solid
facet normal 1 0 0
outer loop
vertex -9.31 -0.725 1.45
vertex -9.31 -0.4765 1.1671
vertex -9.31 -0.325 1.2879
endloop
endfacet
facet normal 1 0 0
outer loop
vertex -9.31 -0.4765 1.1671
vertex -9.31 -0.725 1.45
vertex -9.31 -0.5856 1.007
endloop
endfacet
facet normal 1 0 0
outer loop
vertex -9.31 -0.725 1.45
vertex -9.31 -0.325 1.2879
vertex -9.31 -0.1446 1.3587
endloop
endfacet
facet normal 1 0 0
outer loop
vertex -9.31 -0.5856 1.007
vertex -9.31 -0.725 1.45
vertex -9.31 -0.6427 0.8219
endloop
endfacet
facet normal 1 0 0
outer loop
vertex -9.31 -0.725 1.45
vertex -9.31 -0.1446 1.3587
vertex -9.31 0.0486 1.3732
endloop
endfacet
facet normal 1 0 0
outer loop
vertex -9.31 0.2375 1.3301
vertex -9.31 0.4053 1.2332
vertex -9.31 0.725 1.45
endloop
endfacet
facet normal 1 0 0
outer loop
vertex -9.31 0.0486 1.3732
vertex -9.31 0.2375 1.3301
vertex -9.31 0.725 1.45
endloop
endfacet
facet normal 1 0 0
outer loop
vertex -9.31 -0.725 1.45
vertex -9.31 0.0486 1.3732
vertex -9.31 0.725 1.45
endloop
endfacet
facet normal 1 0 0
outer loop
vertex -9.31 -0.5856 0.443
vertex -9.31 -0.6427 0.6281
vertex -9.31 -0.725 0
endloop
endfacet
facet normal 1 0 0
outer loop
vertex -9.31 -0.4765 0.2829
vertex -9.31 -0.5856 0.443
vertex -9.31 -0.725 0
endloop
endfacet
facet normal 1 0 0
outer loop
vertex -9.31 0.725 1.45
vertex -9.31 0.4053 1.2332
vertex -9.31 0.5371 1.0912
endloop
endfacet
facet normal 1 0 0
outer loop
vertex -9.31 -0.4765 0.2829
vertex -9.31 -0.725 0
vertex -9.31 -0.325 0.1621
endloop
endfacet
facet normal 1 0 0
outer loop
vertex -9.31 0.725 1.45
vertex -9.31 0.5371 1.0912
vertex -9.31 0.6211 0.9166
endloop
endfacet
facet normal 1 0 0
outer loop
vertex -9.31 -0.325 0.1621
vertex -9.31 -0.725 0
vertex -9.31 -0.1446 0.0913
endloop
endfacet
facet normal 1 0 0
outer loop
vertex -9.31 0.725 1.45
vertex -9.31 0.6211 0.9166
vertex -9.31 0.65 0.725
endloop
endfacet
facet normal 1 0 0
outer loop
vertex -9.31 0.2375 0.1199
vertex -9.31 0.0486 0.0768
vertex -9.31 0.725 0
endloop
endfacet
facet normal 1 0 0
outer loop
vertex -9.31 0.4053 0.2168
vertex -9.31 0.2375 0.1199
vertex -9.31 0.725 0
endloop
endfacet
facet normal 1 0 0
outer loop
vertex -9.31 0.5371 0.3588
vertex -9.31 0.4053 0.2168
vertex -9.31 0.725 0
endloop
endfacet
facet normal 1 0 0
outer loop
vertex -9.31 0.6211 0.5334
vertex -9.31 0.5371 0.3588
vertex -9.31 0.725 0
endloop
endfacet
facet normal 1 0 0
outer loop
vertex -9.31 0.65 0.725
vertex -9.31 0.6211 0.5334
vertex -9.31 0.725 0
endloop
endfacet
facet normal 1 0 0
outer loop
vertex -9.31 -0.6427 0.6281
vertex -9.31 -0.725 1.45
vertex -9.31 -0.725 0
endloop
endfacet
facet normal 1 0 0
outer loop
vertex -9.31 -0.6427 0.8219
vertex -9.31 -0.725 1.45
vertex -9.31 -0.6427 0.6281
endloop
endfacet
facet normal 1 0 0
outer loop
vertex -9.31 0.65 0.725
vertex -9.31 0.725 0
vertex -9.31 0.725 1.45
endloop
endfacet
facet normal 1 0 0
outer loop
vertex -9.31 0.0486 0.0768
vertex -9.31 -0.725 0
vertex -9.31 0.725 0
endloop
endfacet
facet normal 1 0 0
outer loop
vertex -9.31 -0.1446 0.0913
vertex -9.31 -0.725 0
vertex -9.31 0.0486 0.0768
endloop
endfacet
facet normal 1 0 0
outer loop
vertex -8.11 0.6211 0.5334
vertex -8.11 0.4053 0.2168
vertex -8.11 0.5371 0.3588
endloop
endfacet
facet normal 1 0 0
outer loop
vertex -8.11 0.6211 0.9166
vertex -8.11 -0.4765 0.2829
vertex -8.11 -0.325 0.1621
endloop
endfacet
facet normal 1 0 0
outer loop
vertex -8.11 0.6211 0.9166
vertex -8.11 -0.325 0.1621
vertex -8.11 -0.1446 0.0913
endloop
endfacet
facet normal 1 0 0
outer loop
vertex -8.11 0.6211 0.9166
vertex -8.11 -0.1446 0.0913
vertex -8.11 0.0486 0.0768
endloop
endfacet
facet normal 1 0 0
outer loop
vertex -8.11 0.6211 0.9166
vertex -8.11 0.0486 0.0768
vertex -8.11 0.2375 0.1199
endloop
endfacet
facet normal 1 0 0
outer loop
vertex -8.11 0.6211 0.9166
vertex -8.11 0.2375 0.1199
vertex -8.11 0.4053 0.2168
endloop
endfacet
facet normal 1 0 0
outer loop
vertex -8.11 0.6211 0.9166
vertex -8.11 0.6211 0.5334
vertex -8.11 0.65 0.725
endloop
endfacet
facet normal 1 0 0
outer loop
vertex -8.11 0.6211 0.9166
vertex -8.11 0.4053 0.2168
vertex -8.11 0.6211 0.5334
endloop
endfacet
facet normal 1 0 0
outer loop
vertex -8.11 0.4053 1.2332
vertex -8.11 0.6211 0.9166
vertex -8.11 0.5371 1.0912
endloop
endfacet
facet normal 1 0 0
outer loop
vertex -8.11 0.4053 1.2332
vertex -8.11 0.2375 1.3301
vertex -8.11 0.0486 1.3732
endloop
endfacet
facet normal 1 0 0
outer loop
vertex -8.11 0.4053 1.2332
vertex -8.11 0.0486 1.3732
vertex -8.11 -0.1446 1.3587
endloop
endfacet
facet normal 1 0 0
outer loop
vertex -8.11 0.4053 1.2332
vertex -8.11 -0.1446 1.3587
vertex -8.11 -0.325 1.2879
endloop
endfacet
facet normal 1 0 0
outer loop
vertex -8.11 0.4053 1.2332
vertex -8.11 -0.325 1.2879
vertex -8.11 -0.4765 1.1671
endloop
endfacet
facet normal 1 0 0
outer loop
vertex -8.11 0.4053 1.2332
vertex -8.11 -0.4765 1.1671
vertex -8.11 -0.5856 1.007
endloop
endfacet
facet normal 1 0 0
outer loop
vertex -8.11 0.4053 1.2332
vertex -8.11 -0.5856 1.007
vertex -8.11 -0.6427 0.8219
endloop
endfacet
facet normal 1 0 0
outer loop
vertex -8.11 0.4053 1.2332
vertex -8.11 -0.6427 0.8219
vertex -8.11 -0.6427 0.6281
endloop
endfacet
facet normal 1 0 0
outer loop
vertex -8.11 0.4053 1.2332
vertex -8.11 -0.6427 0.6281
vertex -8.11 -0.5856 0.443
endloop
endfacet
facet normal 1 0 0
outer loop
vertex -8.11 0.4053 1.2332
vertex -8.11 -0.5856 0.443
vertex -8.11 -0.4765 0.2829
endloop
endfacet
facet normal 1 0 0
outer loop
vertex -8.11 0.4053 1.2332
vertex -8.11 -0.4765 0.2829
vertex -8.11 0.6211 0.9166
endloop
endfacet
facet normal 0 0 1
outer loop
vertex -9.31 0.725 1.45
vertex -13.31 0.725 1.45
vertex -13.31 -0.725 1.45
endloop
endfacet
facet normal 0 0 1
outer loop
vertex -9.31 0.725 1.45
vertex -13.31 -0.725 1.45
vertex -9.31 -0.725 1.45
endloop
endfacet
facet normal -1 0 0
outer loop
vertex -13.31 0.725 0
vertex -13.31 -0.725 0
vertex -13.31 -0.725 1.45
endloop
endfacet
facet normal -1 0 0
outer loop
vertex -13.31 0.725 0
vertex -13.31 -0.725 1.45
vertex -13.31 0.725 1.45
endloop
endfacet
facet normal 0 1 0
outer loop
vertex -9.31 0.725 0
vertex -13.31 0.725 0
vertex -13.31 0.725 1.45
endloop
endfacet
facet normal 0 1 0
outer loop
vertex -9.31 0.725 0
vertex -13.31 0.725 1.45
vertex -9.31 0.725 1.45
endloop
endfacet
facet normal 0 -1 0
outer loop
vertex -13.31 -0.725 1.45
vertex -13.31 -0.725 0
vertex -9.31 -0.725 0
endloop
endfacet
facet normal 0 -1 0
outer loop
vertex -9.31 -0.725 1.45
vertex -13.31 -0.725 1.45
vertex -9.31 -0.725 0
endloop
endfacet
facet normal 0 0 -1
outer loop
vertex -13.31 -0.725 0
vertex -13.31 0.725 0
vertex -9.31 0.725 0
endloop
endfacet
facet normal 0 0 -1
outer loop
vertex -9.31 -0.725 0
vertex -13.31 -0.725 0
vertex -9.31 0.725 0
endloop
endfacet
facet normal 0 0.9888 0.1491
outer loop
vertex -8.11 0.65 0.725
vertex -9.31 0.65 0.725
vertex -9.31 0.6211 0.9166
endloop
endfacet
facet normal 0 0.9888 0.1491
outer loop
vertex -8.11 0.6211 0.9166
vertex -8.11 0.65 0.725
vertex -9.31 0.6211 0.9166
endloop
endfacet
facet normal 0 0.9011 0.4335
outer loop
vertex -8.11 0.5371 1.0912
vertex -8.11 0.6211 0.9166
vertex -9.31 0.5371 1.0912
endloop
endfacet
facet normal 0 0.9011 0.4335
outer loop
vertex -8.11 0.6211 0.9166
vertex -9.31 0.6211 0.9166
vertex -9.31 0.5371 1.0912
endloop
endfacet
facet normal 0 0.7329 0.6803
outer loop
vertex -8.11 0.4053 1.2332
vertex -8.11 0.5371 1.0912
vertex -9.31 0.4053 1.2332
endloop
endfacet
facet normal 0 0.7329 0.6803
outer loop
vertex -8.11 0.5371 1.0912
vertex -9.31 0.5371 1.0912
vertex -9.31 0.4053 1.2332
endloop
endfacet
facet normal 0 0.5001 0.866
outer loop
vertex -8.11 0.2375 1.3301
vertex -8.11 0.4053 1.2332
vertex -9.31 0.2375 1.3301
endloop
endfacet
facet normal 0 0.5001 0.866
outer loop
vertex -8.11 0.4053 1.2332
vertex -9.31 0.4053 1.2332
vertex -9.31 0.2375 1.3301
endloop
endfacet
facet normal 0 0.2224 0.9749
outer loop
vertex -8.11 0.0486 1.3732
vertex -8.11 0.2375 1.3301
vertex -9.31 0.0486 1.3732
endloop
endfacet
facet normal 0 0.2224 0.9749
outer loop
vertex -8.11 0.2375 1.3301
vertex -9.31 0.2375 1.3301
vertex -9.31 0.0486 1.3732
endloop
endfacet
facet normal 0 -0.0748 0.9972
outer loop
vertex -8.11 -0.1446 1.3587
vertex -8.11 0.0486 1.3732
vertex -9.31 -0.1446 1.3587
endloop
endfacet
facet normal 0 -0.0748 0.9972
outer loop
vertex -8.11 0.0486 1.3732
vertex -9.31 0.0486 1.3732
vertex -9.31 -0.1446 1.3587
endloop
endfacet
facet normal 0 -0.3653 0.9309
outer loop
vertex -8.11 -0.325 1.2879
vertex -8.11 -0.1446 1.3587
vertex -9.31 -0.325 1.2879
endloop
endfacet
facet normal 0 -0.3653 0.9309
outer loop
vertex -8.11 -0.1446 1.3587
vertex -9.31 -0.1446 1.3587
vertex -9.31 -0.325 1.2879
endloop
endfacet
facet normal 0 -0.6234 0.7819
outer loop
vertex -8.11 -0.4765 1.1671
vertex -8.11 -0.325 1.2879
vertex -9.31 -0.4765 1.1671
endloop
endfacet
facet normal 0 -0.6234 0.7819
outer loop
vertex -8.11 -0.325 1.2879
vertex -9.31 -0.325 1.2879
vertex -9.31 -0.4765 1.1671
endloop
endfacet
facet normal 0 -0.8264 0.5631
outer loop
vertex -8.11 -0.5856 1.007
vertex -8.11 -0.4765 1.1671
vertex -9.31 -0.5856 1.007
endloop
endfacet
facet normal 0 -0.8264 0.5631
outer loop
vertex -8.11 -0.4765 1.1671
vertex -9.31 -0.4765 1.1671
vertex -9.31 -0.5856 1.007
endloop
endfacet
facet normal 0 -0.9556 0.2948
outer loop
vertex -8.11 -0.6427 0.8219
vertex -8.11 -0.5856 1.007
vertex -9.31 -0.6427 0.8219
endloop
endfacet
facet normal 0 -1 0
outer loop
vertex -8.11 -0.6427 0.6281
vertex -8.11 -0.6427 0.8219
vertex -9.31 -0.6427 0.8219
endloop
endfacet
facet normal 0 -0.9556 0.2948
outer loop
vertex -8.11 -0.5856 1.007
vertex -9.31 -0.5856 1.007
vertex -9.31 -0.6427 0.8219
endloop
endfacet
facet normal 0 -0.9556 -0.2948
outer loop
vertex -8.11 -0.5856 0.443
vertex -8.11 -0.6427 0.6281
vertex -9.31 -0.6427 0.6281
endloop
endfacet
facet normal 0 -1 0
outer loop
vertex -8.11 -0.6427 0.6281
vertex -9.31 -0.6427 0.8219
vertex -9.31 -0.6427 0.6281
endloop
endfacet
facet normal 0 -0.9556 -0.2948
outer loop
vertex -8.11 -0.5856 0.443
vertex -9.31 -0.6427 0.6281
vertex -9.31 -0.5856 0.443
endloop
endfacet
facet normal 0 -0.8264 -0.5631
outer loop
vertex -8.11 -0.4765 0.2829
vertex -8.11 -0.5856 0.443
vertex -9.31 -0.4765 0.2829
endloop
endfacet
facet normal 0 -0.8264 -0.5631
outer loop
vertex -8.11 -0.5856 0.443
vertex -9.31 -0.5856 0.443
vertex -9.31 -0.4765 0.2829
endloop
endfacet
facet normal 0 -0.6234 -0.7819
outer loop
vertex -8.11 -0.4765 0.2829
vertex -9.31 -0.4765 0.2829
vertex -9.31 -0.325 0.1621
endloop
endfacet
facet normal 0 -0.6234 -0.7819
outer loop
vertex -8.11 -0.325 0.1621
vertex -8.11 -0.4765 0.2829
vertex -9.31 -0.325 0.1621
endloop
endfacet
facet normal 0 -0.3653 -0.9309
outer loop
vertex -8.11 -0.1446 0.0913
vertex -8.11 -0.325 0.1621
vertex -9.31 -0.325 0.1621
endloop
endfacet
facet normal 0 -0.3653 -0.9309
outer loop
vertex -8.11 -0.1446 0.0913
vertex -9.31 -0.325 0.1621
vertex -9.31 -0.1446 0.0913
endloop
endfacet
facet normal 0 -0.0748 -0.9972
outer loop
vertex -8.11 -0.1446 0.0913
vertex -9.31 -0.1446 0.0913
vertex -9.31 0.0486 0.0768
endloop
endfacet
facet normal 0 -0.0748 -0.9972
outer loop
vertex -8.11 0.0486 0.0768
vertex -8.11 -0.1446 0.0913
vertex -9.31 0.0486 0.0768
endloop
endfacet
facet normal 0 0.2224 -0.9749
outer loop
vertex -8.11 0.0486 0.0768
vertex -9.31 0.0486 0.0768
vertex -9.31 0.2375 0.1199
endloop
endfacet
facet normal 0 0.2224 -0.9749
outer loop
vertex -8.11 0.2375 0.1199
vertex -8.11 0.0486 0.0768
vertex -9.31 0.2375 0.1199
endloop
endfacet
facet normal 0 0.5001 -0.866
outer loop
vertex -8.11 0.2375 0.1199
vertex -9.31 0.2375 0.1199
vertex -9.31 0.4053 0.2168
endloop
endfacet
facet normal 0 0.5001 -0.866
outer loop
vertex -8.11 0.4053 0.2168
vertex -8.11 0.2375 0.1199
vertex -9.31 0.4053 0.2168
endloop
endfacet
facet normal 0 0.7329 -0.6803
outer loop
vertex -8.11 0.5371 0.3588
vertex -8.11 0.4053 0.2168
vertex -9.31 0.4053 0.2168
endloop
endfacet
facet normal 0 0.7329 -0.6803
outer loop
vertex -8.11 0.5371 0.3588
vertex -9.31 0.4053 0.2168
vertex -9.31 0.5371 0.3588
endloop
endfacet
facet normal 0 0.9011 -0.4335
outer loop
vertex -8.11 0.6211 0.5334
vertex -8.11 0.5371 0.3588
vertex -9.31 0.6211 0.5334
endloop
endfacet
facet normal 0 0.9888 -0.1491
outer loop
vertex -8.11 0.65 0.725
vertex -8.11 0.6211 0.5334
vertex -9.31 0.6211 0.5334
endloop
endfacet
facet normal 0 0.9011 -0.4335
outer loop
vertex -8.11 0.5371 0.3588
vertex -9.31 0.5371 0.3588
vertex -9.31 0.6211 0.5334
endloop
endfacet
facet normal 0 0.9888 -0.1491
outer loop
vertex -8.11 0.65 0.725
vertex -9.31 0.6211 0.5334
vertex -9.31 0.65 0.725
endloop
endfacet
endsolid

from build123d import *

# Parameters (mm, degrees)
F0_W     = 4
F0_H     = 1.45
F1_DEPTH = 1.45
F2_R     = 0.65
F3_DEPTH = 1.2


with BuildPart() as f1:
    # F0 (on Top) → F1 (new body)
    with BuildSketch(Plane.XY):
        with Locations((-11.310024, 0)):
            Rectangle(F0_W, F0_H)
    extrude(amount=F1_DEPTH)

    # F2 (on face) → F3 (join)
    with BuildSketch(Plane.YZ.offset(-9.310024)):
        with Locations((0, 0.725)):
            Circle(F2_R)
    extrude(amount=F3_DEPTH)


solid = f1.part
